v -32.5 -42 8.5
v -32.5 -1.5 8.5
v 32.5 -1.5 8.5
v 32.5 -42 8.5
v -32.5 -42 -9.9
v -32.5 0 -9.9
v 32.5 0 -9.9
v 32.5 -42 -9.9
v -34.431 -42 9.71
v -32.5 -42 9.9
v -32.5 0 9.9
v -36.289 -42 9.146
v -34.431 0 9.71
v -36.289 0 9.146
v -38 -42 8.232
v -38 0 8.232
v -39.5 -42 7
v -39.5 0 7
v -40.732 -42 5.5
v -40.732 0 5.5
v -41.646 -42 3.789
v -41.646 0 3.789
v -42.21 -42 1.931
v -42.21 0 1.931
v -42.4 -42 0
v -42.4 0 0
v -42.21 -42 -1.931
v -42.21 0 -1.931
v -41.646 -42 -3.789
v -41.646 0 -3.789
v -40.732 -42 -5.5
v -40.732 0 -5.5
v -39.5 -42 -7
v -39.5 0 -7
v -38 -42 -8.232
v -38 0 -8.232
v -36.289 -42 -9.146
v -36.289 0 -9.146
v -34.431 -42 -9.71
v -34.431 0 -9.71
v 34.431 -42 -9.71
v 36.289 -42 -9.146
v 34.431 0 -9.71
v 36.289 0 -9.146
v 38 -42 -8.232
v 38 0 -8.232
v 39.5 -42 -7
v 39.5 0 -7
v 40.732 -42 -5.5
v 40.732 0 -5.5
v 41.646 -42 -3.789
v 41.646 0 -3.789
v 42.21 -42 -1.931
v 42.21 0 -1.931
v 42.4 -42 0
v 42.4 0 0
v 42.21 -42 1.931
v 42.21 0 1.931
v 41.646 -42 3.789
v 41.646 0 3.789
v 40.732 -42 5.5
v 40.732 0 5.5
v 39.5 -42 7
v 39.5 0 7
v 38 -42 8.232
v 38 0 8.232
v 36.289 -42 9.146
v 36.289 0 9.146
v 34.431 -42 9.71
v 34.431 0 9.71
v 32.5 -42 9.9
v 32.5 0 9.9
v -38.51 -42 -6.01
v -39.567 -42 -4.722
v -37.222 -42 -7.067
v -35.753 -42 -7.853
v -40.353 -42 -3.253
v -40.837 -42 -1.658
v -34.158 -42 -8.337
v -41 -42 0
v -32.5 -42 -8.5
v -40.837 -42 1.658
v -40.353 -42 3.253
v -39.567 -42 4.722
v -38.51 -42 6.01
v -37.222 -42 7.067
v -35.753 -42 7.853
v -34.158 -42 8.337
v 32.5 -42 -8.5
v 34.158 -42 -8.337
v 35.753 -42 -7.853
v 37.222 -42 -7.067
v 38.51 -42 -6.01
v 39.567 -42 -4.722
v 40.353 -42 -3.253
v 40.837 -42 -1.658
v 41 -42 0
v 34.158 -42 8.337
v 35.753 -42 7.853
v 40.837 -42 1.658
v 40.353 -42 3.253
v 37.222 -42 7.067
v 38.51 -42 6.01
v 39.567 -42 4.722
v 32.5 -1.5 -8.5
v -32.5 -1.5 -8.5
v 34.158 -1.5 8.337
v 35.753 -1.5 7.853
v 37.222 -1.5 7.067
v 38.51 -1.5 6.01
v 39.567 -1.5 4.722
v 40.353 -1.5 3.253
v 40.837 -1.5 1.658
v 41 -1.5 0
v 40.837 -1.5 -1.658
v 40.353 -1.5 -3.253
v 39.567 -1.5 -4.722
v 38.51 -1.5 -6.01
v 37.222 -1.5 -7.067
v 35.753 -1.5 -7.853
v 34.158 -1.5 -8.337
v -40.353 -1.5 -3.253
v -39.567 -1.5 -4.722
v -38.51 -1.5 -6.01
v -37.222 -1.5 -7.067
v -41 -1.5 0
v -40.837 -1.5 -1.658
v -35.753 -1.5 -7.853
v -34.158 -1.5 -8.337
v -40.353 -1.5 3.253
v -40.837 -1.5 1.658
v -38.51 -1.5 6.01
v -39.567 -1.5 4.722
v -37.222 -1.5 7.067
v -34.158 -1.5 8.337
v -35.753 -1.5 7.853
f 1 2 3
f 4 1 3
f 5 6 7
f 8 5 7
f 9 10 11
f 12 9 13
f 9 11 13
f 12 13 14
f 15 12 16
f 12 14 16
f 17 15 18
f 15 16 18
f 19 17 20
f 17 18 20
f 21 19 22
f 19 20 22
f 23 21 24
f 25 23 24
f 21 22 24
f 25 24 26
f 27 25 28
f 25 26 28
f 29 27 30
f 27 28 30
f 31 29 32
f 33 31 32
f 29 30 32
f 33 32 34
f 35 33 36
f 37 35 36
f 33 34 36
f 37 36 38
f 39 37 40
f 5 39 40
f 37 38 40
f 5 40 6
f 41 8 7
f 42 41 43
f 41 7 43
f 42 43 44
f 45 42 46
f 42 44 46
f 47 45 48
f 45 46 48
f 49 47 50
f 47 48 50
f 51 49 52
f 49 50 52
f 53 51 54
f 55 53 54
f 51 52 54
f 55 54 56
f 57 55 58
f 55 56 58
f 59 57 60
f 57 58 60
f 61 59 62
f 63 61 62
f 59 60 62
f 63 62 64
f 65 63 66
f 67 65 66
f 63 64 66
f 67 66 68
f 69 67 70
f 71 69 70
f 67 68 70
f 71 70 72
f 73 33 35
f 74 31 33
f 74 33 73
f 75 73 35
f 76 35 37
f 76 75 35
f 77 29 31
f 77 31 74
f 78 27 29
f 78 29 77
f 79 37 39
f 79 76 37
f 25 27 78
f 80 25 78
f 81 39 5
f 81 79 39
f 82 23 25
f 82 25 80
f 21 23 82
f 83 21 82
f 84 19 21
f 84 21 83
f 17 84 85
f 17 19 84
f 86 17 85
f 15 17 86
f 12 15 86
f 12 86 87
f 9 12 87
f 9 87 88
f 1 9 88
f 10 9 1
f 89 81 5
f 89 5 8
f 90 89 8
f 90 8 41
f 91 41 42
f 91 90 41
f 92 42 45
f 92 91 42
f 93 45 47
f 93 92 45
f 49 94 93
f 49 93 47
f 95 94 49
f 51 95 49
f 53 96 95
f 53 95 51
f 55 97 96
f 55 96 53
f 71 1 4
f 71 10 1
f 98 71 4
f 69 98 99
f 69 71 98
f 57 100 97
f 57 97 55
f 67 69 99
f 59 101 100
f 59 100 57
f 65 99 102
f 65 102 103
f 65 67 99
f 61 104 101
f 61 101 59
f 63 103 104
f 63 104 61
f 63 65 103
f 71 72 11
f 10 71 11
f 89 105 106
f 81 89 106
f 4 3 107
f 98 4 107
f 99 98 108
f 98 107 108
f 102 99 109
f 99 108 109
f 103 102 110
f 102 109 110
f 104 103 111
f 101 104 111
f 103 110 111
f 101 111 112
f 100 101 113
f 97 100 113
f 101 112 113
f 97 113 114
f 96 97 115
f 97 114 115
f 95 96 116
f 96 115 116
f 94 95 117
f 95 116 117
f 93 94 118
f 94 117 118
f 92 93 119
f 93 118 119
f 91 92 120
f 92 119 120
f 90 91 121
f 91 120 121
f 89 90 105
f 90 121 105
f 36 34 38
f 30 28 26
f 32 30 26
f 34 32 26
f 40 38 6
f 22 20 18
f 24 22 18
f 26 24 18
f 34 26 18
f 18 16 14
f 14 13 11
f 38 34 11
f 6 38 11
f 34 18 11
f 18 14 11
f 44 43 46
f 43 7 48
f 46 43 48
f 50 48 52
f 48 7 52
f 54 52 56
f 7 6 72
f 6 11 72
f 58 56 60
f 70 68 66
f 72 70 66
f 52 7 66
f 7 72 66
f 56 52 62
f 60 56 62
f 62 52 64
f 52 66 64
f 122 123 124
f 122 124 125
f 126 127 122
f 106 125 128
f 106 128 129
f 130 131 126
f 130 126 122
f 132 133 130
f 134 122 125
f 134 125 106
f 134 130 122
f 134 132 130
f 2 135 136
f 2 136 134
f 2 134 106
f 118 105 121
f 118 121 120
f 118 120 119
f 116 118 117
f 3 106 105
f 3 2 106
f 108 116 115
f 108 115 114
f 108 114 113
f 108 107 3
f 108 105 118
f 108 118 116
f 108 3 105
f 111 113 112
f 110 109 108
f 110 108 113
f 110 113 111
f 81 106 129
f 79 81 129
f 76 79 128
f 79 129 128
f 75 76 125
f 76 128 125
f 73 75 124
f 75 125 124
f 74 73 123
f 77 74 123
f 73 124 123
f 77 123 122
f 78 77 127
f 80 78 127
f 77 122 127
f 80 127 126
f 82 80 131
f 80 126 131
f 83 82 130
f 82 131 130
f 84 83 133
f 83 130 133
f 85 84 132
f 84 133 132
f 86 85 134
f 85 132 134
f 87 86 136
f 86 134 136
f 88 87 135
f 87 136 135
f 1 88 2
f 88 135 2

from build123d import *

# Parameters (mm, degrees)
F1_DEPTH = 1.5
F2_DEPTH = 42


with BuildPart() as f1:
    # F0 (on Front) → F1 (new body)
    with BuildSketch(Plane.XZ):
        with BuildLine():
            Line((32.5, 8), (-32.5, 8))
            ThreePointArc((-32.5, 8), (-40.5, 0), (-32.5, -8))
            Line((-32.5, -8), (32.5, -8))
            ThreePointArc((32.5, -8), (40.5, 0), (32.5, 8))
        make_face()
        with BuildLine():
            Line((32.5, 8.5), (-32.5, 8.5))
            Line((-32.5, 8.5), (-32.5, 8))
            Line((-32.5, 8), (32.5, 8))
            ThreePointArc((32.5, 8), (40.5, 0), (32.5, -8))
            Line((32.5, -8), (32.5, -8.5))
            ThreePointArc((32.5, -8.5), (41, 0), (32.5, 8.5))
        make_face()
        with BuildLine():
            Line((-32.5, 8), (-32.5, 8.5))
            ThreePointArc((-32.5, 8.5), (-41, 0), (-32.5, -8.5))
            Line((-32.5, -8.5), (32.5, -8.5))
            Line((32.5, -8.5), (32.5, -8))
            Line((32.5, -8), (-32.5, -8))
            ThreePointArc((-32.5, -8), (-40.5, 0), (-32.5, 8))
        make_face()
    extrude(amount=F1_DEPTH)

    # F0 (on Front) → F2 (join)
    with BuildSketch(Plane.XZ):
        with BuildLine():
            Line((32.5, 9.9), (-32.5, 9.9))
            Line((-32.5, 9.9), (-32.5, 8.5))
            Line((-32.5, 8.5), (32.5, 8.5))
            ThreePointArc((32.5, 8.5), (41, 0), (32.5, -8.5))
            Line((32.5, -8.5), (32.5, -9.9))
            ThreePointArc((32.5, -9.9), (42.4, 0), (32.5, 9.9))
        make_face()
        with BuildLine():
            Line((-32.5, 8.5), (-32.5, 9.9))
            ThreePointArc((-32.5, 9.9), (-42.4, 0), (-32.5, -9.9))
            Line((-32.5, -9.9), (32.5, -9.9))
            Line((32.5, -9.9), (32.5, -8.5))
            Line((32.5, -8.5), (-32.5, -8.5))
            ThreePointArc((-32.5, -8.5), (-41, 0), (-32.5, 8.5))
        make_face()
    extrude(amount=F2_DEPTH)


solid = f1.part
